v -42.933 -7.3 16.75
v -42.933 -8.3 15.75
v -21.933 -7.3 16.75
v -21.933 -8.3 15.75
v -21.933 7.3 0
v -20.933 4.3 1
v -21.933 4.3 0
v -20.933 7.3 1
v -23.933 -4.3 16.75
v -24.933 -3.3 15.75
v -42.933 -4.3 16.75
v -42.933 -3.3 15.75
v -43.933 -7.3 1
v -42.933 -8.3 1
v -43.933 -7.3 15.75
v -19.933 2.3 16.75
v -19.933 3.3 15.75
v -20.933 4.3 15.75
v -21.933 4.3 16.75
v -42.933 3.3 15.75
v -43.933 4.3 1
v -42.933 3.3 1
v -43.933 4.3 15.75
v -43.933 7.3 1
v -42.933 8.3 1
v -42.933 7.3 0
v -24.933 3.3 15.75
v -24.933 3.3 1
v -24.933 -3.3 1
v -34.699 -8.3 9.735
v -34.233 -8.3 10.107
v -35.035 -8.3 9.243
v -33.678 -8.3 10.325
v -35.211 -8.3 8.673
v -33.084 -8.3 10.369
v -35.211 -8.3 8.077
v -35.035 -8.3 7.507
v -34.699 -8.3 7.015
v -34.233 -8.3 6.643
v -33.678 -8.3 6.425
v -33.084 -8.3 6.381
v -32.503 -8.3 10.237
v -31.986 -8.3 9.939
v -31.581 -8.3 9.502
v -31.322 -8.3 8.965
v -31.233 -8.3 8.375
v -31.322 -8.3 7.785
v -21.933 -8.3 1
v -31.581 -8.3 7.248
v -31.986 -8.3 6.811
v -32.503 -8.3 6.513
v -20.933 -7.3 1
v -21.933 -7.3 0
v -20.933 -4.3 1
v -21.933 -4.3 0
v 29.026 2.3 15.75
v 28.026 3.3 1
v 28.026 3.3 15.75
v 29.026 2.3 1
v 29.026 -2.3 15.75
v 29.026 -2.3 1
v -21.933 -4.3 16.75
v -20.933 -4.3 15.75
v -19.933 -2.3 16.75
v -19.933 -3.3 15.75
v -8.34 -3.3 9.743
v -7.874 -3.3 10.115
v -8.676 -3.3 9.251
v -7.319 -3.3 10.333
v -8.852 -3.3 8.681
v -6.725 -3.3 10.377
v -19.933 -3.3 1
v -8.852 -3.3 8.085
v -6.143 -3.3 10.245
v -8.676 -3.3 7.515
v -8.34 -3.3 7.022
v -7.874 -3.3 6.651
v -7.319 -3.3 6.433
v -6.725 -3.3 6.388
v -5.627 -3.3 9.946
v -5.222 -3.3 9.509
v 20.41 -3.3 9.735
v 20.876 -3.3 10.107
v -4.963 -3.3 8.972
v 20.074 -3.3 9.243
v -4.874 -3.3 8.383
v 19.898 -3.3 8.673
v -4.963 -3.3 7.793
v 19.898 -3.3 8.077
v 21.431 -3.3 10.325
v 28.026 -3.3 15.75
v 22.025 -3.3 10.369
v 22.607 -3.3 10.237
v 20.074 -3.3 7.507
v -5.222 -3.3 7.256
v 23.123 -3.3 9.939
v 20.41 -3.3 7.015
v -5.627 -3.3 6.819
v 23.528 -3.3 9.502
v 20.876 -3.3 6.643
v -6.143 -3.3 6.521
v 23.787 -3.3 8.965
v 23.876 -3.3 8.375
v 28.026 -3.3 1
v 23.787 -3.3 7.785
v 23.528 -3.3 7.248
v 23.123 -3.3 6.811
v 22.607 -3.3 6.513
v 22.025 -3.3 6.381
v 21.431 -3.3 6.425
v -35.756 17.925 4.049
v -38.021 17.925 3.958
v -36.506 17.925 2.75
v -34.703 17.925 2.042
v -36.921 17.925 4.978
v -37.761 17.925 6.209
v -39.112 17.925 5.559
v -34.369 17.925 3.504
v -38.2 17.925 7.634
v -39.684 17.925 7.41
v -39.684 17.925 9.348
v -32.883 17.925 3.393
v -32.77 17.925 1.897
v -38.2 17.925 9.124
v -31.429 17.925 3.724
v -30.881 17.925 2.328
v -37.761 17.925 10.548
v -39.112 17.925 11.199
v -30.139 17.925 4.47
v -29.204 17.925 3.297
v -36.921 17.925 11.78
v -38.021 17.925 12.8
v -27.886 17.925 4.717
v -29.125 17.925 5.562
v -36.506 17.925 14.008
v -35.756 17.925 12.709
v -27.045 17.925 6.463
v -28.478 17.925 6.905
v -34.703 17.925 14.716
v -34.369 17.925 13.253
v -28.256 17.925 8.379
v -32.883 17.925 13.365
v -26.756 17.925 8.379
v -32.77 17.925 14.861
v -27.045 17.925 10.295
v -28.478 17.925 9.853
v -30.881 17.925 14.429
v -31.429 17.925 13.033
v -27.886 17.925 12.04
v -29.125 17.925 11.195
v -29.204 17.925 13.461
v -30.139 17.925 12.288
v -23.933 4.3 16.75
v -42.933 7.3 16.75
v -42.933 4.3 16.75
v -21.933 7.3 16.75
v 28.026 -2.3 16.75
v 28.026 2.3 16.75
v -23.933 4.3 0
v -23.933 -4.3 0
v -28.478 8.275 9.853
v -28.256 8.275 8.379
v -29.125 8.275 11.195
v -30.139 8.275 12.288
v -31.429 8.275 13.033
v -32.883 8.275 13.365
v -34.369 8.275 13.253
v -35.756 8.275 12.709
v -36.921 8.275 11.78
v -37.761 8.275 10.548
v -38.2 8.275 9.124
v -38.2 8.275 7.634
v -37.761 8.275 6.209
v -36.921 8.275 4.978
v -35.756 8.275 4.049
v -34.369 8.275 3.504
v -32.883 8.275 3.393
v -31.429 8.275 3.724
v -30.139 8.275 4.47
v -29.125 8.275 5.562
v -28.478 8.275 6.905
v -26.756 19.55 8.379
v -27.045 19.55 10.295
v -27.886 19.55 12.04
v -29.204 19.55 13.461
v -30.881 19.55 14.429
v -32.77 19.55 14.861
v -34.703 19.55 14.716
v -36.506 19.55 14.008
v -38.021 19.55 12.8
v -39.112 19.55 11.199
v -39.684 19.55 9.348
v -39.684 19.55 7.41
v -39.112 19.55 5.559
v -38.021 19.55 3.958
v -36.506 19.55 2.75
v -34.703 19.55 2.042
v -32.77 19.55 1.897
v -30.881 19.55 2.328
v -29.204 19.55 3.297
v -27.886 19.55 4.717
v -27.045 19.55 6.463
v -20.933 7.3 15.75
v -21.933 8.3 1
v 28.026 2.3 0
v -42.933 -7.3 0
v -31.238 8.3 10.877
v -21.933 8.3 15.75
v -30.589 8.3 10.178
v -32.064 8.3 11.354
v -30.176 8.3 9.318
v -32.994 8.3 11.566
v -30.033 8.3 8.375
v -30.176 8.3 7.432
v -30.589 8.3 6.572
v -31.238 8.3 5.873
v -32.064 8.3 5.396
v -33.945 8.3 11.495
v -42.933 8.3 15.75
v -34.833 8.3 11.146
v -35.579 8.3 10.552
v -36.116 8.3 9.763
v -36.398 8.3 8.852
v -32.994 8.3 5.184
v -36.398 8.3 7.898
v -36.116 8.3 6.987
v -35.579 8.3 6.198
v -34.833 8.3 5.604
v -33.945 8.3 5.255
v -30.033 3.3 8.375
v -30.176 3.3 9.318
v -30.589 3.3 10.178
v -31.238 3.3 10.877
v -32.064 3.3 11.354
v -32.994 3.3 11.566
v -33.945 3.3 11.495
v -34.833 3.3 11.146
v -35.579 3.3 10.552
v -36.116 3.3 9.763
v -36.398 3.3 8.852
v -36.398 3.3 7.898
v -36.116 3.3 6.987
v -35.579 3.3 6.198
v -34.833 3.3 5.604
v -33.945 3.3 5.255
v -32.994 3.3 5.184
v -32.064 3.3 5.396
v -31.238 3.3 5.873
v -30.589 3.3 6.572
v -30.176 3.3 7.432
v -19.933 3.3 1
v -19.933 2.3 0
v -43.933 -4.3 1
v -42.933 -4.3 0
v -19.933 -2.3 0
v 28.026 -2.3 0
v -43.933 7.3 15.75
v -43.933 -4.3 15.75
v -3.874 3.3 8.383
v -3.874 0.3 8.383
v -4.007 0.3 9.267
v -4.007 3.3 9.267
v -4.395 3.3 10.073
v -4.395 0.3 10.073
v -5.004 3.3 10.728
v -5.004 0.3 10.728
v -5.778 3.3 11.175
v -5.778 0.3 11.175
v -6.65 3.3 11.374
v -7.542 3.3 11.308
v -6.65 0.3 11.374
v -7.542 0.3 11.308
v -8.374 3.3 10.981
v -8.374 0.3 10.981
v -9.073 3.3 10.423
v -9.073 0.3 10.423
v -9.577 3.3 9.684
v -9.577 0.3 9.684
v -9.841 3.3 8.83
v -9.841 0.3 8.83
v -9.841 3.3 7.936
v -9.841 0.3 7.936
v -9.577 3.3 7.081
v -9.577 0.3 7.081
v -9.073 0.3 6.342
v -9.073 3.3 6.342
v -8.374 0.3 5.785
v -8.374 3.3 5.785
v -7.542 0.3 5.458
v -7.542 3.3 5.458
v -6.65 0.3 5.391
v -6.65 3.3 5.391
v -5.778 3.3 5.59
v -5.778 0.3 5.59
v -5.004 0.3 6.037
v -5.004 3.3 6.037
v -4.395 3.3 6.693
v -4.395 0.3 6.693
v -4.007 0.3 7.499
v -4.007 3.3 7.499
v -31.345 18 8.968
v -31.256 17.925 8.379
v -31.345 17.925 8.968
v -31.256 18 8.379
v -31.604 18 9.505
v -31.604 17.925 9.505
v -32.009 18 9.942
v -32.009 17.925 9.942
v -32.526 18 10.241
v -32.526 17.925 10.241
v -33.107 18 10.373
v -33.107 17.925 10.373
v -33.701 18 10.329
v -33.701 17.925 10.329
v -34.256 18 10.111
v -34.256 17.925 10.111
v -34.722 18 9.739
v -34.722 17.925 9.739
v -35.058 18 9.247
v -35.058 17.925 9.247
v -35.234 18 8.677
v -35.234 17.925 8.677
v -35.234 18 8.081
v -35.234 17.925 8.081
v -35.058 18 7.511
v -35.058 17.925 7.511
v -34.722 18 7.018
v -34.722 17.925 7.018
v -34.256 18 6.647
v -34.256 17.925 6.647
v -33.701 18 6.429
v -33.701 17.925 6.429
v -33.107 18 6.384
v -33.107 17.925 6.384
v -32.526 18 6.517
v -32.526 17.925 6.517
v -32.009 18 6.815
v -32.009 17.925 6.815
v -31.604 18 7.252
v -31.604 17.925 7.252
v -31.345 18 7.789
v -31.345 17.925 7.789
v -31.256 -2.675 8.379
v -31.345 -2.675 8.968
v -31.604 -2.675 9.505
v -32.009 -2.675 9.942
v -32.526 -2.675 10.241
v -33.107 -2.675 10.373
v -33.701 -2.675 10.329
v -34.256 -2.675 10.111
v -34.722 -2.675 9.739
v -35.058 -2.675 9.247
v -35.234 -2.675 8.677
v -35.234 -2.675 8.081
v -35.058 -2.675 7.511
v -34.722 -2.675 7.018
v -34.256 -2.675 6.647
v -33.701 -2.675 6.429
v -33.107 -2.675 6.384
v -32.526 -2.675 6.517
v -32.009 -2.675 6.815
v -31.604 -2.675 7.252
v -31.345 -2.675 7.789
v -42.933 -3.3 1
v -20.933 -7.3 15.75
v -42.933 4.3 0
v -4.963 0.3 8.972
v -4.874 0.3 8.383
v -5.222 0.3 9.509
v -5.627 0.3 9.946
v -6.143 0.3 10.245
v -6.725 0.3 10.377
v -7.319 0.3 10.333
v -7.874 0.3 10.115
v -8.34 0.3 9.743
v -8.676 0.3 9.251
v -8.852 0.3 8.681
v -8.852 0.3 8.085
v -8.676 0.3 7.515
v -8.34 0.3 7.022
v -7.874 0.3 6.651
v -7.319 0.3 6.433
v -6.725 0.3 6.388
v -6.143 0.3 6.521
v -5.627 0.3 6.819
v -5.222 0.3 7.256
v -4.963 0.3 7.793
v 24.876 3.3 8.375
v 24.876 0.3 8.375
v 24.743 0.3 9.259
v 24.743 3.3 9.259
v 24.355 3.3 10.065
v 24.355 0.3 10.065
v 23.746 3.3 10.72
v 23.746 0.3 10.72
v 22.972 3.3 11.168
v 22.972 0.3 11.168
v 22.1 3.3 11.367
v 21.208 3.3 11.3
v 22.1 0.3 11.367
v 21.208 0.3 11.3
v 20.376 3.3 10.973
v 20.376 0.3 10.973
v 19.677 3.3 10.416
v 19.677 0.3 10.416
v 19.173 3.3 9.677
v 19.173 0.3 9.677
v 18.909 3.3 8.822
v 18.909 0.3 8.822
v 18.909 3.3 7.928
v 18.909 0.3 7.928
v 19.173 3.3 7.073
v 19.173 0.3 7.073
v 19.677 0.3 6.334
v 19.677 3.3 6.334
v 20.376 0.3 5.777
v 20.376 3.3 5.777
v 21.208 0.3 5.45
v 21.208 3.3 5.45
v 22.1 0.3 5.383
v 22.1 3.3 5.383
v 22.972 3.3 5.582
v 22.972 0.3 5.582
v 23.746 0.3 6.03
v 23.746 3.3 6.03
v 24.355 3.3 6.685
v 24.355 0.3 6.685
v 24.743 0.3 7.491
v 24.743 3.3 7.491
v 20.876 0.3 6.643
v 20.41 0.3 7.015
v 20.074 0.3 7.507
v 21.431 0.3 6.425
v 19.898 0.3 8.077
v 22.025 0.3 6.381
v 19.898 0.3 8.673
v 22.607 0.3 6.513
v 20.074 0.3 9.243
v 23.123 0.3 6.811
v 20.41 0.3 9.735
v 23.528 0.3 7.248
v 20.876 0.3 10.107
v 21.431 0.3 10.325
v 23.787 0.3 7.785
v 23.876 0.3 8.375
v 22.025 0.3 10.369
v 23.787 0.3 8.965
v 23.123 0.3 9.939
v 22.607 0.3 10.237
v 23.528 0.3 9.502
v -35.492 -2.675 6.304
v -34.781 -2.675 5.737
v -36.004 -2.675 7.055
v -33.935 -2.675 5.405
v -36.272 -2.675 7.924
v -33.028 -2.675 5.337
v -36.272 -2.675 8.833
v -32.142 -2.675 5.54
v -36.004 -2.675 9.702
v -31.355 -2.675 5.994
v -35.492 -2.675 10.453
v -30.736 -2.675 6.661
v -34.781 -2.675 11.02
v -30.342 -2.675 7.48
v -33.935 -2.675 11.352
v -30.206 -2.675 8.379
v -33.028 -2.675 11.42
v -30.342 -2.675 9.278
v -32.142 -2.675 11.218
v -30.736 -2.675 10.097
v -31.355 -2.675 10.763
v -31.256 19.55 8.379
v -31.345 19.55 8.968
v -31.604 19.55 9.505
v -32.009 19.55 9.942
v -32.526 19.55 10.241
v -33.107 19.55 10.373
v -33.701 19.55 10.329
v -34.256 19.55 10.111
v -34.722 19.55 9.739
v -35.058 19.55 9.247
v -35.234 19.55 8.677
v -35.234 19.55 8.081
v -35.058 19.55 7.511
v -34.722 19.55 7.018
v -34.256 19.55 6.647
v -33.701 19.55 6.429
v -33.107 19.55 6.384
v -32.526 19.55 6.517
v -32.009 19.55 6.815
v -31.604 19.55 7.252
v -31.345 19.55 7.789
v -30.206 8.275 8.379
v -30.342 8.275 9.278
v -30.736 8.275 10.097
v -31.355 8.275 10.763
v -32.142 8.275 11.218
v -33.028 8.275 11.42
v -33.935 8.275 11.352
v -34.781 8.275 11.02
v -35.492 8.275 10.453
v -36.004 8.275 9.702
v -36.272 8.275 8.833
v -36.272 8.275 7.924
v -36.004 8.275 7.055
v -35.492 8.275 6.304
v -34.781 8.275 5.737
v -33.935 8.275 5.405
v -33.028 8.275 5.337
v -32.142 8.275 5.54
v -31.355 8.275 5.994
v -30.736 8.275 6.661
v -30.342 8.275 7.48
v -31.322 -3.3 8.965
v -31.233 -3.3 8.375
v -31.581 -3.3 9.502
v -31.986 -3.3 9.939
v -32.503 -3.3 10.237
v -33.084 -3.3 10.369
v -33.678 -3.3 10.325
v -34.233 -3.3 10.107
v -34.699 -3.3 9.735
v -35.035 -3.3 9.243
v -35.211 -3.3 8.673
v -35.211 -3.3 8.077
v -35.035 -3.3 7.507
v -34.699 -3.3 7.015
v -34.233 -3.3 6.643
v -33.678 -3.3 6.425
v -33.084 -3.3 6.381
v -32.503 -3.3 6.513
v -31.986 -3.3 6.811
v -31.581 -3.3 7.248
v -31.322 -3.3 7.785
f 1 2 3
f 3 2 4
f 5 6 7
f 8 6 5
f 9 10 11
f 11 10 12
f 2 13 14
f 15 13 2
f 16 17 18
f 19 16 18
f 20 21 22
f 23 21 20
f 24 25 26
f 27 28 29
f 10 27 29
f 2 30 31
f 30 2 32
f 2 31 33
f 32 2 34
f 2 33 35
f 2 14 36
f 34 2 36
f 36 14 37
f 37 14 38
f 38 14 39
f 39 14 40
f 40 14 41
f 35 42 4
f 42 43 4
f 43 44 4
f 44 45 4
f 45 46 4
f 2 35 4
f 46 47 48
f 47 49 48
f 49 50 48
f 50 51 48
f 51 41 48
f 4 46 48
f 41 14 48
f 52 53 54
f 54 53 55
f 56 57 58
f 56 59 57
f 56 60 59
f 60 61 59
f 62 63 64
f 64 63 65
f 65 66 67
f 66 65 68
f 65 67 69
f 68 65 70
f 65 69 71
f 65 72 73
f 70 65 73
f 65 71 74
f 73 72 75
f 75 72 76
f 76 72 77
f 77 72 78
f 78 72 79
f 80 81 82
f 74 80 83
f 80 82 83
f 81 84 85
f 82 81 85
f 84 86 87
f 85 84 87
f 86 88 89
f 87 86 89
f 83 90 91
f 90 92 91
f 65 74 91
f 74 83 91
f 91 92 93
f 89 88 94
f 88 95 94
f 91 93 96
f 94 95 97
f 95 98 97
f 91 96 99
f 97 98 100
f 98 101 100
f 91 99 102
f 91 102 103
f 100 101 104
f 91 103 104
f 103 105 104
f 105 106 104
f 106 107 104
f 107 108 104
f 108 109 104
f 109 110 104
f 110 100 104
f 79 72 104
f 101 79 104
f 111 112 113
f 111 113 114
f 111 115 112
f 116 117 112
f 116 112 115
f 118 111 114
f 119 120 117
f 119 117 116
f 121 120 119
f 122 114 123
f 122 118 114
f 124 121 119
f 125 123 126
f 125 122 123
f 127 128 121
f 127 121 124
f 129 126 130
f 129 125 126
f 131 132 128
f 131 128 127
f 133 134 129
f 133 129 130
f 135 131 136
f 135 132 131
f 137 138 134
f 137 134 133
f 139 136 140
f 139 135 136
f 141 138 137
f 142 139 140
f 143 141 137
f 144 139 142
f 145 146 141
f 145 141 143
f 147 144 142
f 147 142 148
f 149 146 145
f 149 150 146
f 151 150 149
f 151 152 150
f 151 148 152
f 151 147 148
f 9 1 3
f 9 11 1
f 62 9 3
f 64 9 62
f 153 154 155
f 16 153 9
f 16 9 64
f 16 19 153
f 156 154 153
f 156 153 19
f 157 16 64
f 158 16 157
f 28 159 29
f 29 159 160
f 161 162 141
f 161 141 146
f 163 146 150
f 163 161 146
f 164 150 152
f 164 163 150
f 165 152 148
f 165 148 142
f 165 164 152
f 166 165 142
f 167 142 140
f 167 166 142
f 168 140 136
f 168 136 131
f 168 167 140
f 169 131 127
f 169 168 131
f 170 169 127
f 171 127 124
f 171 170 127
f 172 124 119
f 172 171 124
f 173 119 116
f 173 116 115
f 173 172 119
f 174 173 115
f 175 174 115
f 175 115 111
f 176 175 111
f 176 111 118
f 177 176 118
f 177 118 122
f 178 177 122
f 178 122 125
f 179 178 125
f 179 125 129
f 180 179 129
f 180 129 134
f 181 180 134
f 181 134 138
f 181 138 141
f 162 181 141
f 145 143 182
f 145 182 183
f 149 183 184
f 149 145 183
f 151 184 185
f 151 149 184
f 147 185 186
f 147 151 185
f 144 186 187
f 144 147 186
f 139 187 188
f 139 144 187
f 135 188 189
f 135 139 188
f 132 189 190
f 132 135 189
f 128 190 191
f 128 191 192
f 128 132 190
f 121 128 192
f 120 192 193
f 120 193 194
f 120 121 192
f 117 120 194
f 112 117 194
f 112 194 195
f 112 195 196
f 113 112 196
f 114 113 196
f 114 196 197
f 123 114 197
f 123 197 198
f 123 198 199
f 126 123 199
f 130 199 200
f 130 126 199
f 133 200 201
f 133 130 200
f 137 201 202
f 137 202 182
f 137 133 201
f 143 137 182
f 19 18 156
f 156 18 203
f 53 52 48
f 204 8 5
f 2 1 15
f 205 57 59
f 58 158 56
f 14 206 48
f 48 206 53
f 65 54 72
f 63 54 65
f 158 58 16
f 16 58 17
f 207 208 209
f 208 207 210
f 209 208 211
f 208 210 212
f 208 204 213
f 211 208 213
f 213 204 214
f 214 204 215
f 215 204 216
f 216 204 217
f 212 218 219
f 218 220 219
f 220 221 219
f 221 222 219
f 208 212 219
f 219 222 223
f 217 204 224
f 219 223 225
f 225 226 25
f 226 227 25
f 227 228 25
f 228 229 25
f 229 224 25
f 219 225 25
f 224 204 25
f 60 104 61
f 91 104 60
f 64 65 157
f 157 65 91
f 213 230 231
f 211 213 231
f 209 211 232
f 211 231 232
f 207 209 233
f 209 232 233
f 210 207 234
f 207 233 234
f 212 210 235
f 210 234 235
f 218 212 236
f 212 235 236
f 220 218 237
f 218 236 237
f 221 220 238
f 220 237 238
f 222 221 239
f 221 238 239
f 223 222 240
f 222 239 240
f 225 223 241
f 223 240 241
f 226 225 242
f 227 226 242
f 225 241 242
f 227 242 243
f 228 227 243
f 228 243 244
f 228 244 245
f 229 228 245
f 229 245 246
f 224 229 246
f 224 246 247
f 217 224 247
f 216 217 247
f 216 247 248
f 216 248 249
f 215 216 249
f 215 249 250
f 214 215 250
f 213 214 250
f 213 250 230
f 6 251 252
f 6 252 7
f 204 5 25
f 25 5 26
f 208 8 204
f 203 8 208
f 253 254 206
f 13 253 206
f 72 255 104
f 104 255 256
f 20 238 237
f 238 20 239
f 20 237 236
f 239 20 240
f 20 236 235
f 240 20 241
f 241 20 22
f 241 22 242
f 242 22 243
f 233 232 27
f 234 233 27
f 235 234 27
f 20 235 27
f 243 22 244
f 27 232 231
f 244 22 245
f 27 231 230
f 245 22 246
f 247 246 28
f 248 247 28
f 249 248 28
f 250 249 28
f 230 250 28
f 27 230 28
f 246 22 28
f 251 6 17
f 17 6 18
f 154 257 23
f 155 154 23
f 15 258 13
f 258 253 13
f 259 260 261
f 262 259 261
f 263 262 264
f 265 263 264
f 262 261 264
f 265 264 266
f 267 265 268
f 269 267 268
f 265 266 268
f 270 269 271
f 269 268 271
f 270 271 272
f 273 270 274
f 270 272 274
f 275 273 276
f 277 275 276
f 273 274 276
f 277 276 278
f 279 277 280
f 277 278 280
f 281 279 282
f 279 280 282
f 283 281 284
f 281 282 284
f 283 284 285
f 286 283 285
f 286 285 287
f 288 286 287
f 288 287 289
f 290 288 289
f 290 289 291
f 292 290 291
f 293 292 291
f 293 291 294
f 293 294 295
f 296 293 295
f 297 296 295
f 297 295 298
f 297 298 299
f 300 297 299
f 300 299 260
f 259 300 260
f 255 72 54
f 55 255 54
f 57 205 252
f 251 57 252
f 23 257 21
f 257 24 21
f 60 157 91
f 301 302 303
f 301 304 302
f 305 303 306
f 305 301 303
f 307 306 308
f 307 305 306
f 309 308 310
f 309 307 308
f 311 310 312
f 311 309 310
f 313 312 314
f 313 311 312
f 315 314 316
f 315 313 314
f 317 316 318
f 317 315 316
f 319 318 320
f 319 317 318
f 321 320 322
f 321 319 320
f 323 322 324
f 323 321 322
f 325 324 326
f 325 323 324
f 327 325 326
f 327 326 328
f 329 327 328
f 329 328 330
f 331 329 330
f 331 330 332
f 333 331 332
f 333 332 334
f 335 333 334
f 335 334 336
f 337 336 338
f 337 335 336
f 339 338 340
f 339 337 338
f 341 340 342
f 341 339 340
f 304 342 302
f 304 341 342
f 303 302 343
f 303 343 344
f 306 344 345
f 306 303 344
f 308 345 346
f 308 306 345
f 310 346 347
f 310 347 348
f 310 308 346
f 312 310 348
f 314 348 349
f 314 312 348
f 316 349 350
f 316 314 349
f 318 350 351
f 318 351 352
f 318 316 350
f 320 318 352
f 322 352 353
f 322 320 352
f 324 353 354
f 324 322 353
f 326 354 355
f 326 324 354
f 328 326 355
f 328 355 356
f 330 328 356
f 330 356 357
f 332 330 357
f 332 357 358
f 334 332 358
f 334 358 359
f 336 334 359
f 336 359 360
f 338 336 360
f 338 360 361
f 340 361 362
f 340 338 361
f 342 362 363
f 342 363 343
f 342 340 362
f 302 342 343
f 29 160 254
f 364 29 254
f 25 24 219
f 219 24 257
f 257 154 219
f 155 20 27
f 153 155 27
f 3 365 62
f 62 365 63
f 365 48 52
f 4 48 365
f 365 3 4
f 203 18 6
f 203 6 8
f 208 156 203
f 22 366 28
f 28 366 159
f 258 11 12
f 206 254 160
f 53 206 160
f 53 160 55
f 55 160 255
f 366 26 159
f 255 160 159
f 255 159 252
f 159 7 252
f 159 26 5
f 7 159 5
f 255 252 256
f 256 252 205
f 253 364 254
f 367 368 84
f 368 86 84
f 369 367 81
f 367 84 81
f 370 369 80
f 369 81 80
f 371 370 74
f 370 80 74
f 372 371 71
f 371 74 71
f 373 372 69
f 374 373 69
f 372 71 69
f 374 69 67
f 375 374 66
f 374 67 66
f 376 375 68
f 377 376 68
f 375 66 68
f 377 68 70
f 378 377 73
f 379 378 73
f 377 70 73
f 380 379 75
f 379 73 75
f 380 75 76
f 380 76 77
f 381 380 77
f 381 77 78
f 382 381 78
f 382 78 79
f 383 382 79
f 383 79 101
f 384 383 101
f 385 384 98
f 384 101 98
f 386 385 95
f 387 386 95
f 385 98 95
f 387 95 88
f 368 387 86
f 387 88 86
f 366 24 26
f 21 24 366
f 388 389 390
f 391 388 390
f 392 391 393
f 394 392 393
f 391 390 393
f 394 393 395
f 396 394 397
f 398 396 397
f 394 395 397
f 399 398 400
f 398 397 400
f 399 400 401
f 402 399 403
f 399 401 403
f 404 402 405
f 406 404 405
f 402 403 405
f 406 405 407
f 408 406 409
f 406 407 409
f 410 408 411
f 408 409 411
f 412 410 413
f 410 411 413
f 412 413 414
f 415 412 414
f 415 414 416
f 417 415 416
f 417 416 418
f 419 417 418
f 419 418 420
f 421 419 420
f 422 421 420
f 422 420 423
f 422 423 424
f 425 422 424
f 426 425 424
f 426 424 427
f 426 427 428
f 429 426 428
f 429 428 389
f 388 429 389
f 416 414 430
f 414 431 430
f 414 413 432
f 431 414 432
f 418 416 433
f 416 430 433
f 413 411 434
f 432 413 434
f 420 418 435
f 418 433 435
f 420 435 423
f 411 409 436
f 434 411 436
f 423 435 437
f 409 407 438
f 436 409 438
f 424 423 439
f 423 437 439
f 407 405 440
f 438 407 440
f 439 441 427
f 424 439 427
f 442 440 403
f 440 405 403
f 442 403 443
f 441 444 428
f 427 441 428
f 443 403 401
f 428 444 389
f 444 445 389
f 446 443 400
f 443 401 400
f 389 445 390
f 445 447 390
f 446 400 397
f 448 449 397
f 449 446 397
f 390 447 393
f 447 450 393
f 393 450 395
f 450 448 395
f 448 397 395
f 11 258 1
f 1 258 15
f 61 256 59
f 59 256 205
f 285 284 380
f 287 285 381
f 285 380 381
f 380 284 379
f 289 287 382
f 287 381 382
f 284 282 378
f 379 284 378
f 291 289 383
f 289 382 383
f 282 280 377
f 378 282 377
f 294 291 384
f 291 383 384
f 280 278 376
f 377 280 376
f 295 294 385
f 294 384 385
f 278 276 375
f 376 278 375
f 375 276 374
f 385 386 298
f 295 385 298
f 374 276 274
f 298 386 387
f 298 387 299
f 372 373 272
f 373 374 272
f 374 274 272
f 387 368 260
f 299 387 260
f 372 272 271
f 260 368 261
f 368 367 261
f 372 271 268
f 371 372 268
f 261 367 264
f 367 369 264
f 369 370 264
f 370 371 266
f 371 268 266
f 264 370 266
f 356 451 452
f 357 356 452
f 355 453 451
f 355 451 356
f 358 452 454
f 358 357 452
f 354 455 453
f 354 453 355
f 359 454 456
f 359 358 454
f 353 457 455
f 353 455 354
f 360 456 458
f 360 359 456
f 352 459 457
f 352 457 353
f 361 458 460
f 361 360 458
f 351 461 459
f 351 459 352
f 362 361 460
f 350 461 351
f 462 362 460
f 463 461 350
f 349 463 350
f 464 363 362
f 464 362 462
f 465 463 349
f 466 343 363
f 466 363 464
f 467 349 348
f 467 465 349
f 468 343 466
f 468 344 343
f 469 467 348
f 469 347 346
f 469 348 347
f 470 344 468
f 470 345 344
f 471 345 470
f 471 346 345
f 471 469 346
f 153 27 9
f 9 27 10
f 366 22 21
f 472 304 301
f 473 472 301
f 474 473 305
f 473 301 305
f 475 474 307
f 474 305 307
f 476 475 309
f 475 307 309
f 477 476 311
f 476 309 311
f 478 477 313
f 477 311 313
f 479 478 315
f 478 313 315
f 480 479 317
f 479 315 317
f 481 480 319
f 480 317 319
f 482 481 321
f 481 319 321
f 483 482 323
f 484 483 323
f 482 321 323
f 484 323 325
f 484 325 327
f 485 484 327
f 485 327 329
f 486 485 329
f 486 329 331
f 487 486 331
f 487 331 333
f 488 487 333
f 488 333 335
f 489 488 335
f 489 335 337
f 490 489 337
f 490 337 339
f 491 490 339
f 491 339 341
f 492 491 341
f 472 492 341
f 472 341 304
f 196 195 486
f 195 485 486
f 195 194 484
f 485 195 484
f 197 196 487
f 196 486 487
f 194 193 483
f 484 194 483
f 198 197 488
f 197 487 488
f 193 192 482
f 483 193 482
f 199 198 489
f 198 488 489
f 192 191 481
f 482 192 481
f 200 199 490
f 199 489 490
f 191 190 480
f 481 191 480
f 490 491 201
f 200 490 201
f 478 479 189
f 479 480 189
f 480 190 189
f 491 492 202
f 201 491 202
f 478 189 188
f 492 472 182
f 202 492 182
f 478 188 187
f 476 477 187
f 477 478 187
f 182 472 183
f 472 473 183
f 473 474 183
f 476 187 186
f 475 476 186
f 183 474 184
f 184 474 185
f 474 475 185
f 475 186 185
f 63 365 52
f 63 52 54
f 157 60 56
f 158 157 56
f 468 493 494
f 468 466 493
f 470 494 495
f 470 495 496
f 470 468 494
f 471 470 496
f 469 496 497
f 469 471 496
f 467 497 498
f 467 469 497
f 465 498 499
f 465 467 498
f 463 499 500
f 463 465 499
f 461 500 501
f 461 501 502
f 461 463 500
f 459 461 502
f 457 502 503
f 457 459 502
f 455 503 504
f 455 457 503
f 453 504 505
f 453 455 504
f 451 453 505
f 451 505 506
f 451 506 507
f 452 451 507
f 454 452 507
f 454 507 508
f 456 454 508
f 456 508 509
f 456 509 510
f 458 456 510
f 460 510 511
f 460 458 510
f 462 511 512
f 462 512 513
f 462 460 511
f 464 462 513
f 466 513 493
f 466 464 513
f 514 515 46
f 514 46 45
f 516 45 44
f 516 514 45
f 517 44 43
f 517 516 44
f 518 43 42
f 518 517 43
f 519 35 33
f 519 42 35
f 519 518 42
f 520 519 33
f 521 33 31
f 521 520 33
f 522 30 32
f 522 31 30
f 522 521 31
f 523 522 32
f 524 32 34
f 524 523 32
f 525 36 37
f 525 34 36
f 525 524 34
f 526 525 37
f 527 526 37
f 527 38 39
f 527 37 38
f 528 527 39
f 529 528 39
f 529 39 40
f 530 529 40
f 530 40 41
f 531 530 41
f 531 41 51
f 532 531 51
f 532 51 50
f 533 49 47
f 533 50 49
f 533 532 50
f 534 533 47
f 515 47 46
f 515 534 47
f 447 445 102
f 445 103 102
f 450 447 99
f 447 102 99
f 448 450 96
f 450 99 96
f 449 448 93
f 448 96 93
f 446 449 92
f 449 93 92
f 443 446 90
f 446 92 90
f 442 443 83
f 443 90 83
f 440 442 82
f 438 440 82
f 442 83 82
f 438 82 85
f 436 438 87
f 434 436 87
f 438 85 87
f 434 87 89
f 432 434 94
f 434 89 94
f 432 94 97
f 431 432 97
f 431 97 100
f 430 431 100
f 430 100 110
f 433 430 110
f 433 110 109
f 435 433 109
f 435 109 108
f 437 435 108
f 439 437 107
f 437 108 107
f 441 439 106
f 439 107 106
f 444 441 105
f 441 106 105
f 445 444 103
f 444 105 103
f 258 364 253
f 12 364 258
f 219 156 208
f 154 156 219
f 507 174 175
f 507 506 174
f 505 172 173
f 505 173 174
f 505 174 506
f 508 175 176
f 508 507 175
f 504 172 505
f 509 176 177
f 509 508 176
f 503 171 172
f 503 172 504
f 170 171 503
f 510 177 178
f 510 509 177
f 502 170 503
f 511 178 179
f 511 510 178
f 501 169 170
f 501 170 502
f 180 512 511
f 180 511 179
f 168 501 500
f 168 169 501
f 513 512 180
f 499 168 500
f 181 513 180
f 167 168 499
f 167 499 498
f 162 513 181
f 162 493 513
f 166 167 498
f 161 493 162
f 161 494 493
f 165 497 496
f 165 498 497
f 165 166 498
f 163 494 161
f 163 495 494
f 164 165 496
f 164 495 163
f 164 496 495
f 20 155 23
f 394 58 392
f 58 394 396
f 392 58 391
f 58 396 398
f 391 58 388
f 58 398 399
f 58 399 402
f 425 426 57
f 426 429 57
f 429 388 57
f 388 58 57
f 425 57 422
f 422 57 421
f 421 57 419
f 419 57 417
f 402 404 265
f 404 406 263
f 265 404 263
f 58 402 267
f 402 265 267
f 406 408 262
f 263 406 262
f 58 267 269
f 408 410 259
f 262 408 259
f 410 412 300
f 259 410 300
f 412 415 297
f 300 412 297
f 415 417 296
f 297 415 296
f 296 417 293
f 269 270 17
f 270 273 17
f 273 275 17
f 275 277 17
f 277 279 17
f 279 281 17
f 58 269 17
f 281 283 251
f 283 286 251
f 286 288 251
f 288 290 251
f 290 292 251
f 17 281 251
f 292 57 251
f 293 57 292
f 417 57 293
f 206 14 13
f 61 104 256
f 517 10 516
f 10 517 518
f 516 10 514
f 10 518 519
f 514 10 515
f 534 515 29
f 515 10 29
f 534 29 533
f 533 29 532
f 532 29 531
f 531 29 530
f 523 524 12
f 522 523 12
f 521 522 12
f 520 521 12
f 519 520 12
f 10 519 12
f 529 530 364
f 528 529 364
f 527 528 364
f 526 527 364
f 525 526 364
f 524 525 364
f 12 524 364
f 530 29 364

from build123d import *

# Parameters (mm, degrees)
F1_DEPTH      = 16.75
F2_R          = 2
F3_DEPTH      = 12.5
F4_SIZE       = 1
F2_R_2        = 3.2
F5_DEPTH      = 25
F6_DEPTH      = 15.55
F7_R          = 3.05
F7_R_2        = 2
F8_DEPTH      = 2.675
F8_DEPTH_BACK = 18
F9_START      = -8.275
F7_R_3        = 5
F9_DEPTH      = 9.725
F10_START     = -0.3
F2_R_3        = 3
F10_DEPTH     = 9.85
F11_START     = -17.925
F7_R_4        = 6.5
F11_DEPTH     = 1.625


with BuildPart() as f1:
    # F0 (on Top) → F1 (new body)
    with BuildSketch(Plane.XY):
        Polygon((-20.9333471719, 8.3), (-43.9333471719, 8.3), (-43.9333471719, 3.3), (-24.9333471719, 3.3), (-24.9333471719, 0), (-24.9333471719, -3.3), (-43.9333471719, -3.3), (-43.9333471719, -8.3), (-20.9333471719, -8.3), (-20.9333471719, -3.3), (-20.9333471719, 0), (-20.9333471719, 3.3), align=None)
        Polygon((29.0258359164, 3.3), (-20.9333471719, 3.3), (-20.9333471719, 0), (-20.9333471719, -3.3), (29.0258359164, -3.3), (29.0258359164, 0), align=None)
    extrude(amount=F1_DEPTH)

    # F2 (on Front) → F3 (cut, symmetric)
    with BuildSketch(Plane.XZ):
        with Locations((21.8758359164, 8.375)):
            Circle(F2_R)
        with Locations((-6.8741640836, 8.382800118)):
            Circle(F2_R)
    extrude(amount=F3_DEPTH, both=True, mode=Mode.SUBTRACT)

    # F4
    f4_edges = [f1.edges().sort_by_distance(p)[0] for p in [
        (-32.433347, -8.3, 16.75),
        (-20.933347, -5.8, 16.75),
        (4.046244, -3.3, 16.75),
        (29.025836, 0, 16.75),
        (4.046244, 3.3, 16.75),
        (-20.933347, 5.8, 16.75),
        (-32.433347, 8.3, 16.75),
        (-43.933347, 5.8, 16.75),
        (-43.933347, -5.8, 16.75),
        (29.025836, -3.3, 8.375),
        (29.025836, 3.3, 8.375),
        (4.046244, 3.3, 0),
        (4.046244, -3.3, 0),
        (-20.933347, -5.8, 0),
        (-20.933347, 5.8, 0),
        (-20.933347, -8.3, 8.375),
        (-20.933347, 8.3, 8.375),
        (-32.433347, 8.3, 0),
        (-32.433347, -8.3, 0),
        (-24.933347, 0, 0),
        (-24.933347, 0, 16.75),
        (-34.433347, 3.3, 16.75),
        (-34.433347, -3.3, 16.75),
        (-34.433347, -3.3, 0),
        (-34.433347, 3.3, 0),
        (-43.933347, -8.3, 8.375),
        (-43.933347, 8.3, 8.375),
        (-43.933347, 3.3, 8.375),
        (-43.933347, -3.3, 8.375),
        (-43.933347, 5.8, 0),
        (-43.933347, -5.8, 0),
        (29.025836, 0, 0),
        (-20.933347, -3.3, 8.375),
        (-20.933347, 3.3, 8.375),
    ]]
    chamfer(f4_edges, length=F4_SIZE)

    # F2 (on Front) → F5 (cut)
    with BuildSketch(Plane.XZ):
        with Locations((-33.2333471719, 8.375)):
            Circle(F2_R_2)
        with Locations((-33.2333471719, 8.375)):
            Circle(F2_R, mode=Mode.SUBTRACT)
        with Locations((-33.2333471719, 8.375)):
            Circle(F2_R)
    extrude(amount=-F5_DEPTH, mode=Mode.SUBTRACT)

    # F2 (on Front) → F6 (cut)
    with BuildSketch(Plane.XZ):
        with Locations((-33.2333471719, 8.375)):
            Circle(F2_R)
    extrude(amount=F6_DEPTH, mode=Mode.SUBTRACT)

    # F2 (on Front) → F10 (cut)
    with BuildSketch(Plane.XZ.offset(F10_START)):
        with Locations((21.8758359164, 8.375)):
            Circle(F2_R_3)
        with Locations((21.8758359164, 8.375)):
            Circle(F2_R, mode=Mode.SUBTRACT)
        with Locations((-6.8741640836, 8.382800118)):
            Circle(F2_R_3)
        with Locations((-6.8741640836, 8.382800118)):
            Circle(F2_R, mode=Mode.SUBTRACT)
    extrude(amount=-F10_DEPTH, mode=Mode.SUBTRACT)


with BuildPart() as f8:
    # F7 (on Front) → F8 (new body, two sides)
    with BuildSketch(Plane.XZ) as f8_sk:
        with Locations((-33.2561954856, 8.3787553012)):
            Circle(F7_R)
        with Locations((-33.2561954856, 8.3787553012)):
            Circle(F7_R_2, mode=Mode.SUBTRACT)
    extrude(amount=F8_DEPTH)
    extrude(f8_sk.sketch, amount=-F8_DEPTH_BACK)



with BuildPart() as f9:
    # F7 (on Front) → F9 (new body)
    with BuildSketch(Plane.XZ.offset(F9_START)):
        with Locations((-33.2561954856, 8.3787553012)):
            Circle(F7_R_3)
        with Locations((-33.2561954856, 8.3787553012)):
            Circle(F7_R, mode=Mode.SUBTRACT)
    extrude(amount=-F9_DEPTH)


with BuildPart() as f8_1:
    add(f8.part)

    add(f9.part)  # F11 merges F9
    # F7 (on Front) → F11 (join)
    with BuildSketch(Plane.XZ.offset(F11_START)):
        with Locations((-33.2561954856, 8.3787553012)):
            Circle(F7_R_4)
        with Locations((-33.2561954856, 8.3787553012)):
            Circle(F7_R_3, mode=Mode.SUBTRACT)
        with Locations((-33.2561954856, 8.3787553012)):
            Circle(F7_R_3)
        with Locations((-33.2561954856, 8.3787553012)):
            Circle(F7_R, mode=Mode.SUBTRACT)
        with Locations((-33.2561954856, 8.3787553012)):
            Circle(F7_R)
        with Locations((-33.2561954856, 8.3787553012)):
            Circle(F7_R_2, mode=Mode.SUBTRACT)
    extrude(amount=-F11_DEPTH)


solid = Compound([f1.part, f8_1.part])
